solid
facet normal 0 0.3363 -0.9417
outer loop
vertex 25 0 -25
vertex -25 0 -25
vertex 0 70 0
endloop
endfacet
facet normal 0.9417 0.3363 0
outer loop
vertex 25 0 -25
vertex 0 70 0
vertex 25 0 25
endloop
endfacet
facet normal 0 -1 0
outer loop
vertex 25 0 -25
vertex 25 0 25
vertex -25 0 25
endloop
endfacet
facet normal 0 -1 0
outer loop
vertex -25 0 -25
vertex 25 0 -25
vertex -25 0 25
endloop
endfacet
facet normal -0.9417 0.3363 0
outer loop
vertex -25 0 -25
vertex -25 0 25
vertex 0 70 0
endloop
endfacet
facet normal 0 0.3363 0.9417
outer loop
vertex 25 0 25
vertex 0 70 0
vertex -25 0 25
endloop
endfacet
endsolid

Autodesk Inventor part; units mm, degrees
ref_plane "YZ Plane" through (0, 0, 0) normal (1, 0, 0) x (0, 1, 0)
ref_plane "XZ Plane" through (0, 0, 0) normal (0, 1, 0) x (-1, 0, 0)
ref_plane "XY Plane" through (0, 0, 0) normal (0, 0, 1) x (1, 0, 0)
sketch "Sketch3" plane through (0, 0, 0) normal (0, 1, 0) x (-1, 0, 0)
  line L0 (-25, 25) -> (25, 25)
  line L1 (25, 25) -> (25, -25)
  line L2 (25, -25) -> (-25, -25)
  line L3 (-25, -25) -> (-25, 25)
  line L4 (-25, 25) -> (25, -25) construction
  line L5 (25, 25) -> (-25, -25) construction
  point P0 (0, 0)
  dimension "d6" = 50
  dimension "d7" = 50
extrude "Extrusion2" add sketch "Sketch3" along normal blind 70
sketch "Sketch4" plane through (-25, 0, 25) normal (0, 0, 1) x (1, 0, 0)
  line L0 (50, 0) -> (0, 0) projected
  line L1 (0, 0) -> (25, 70)
  line L2 (50, 70) -> (0, 70) projected
  line L3 (0, 0) -> (0, 70) projected
  line L4 (0, 70) -> (0, 0)
  point P0 (25, 0)
extrude "Extrusion3" cut sketch "Sketch4" along normal through all both and the other way through all
mirror "Mirror1" about plane through (0, 0, 0) normal (1, 0, 0) of "Extrusion3"
sketch "Sketch5" plane through (0, 0, 0) normal (1, 0, 0) x (0, 1, 0)
  line L0 (70, -25) -> (70, 25) projected
  line L1 (70, 0) -> (70, -25)
  line L2 (70, -25) -> (0, -25)
  line L3 (0, -25) -> (70, 0)
  point P0 (0, 0)
extrude "Extrusion4" cut sketch "Sketch5" along normal through all both and the other way through all
mirror "Mirror2" about plane through (0, 0, 0) normal (0, 0, 1) of "Extrusion4"
properties part number "exp1"
